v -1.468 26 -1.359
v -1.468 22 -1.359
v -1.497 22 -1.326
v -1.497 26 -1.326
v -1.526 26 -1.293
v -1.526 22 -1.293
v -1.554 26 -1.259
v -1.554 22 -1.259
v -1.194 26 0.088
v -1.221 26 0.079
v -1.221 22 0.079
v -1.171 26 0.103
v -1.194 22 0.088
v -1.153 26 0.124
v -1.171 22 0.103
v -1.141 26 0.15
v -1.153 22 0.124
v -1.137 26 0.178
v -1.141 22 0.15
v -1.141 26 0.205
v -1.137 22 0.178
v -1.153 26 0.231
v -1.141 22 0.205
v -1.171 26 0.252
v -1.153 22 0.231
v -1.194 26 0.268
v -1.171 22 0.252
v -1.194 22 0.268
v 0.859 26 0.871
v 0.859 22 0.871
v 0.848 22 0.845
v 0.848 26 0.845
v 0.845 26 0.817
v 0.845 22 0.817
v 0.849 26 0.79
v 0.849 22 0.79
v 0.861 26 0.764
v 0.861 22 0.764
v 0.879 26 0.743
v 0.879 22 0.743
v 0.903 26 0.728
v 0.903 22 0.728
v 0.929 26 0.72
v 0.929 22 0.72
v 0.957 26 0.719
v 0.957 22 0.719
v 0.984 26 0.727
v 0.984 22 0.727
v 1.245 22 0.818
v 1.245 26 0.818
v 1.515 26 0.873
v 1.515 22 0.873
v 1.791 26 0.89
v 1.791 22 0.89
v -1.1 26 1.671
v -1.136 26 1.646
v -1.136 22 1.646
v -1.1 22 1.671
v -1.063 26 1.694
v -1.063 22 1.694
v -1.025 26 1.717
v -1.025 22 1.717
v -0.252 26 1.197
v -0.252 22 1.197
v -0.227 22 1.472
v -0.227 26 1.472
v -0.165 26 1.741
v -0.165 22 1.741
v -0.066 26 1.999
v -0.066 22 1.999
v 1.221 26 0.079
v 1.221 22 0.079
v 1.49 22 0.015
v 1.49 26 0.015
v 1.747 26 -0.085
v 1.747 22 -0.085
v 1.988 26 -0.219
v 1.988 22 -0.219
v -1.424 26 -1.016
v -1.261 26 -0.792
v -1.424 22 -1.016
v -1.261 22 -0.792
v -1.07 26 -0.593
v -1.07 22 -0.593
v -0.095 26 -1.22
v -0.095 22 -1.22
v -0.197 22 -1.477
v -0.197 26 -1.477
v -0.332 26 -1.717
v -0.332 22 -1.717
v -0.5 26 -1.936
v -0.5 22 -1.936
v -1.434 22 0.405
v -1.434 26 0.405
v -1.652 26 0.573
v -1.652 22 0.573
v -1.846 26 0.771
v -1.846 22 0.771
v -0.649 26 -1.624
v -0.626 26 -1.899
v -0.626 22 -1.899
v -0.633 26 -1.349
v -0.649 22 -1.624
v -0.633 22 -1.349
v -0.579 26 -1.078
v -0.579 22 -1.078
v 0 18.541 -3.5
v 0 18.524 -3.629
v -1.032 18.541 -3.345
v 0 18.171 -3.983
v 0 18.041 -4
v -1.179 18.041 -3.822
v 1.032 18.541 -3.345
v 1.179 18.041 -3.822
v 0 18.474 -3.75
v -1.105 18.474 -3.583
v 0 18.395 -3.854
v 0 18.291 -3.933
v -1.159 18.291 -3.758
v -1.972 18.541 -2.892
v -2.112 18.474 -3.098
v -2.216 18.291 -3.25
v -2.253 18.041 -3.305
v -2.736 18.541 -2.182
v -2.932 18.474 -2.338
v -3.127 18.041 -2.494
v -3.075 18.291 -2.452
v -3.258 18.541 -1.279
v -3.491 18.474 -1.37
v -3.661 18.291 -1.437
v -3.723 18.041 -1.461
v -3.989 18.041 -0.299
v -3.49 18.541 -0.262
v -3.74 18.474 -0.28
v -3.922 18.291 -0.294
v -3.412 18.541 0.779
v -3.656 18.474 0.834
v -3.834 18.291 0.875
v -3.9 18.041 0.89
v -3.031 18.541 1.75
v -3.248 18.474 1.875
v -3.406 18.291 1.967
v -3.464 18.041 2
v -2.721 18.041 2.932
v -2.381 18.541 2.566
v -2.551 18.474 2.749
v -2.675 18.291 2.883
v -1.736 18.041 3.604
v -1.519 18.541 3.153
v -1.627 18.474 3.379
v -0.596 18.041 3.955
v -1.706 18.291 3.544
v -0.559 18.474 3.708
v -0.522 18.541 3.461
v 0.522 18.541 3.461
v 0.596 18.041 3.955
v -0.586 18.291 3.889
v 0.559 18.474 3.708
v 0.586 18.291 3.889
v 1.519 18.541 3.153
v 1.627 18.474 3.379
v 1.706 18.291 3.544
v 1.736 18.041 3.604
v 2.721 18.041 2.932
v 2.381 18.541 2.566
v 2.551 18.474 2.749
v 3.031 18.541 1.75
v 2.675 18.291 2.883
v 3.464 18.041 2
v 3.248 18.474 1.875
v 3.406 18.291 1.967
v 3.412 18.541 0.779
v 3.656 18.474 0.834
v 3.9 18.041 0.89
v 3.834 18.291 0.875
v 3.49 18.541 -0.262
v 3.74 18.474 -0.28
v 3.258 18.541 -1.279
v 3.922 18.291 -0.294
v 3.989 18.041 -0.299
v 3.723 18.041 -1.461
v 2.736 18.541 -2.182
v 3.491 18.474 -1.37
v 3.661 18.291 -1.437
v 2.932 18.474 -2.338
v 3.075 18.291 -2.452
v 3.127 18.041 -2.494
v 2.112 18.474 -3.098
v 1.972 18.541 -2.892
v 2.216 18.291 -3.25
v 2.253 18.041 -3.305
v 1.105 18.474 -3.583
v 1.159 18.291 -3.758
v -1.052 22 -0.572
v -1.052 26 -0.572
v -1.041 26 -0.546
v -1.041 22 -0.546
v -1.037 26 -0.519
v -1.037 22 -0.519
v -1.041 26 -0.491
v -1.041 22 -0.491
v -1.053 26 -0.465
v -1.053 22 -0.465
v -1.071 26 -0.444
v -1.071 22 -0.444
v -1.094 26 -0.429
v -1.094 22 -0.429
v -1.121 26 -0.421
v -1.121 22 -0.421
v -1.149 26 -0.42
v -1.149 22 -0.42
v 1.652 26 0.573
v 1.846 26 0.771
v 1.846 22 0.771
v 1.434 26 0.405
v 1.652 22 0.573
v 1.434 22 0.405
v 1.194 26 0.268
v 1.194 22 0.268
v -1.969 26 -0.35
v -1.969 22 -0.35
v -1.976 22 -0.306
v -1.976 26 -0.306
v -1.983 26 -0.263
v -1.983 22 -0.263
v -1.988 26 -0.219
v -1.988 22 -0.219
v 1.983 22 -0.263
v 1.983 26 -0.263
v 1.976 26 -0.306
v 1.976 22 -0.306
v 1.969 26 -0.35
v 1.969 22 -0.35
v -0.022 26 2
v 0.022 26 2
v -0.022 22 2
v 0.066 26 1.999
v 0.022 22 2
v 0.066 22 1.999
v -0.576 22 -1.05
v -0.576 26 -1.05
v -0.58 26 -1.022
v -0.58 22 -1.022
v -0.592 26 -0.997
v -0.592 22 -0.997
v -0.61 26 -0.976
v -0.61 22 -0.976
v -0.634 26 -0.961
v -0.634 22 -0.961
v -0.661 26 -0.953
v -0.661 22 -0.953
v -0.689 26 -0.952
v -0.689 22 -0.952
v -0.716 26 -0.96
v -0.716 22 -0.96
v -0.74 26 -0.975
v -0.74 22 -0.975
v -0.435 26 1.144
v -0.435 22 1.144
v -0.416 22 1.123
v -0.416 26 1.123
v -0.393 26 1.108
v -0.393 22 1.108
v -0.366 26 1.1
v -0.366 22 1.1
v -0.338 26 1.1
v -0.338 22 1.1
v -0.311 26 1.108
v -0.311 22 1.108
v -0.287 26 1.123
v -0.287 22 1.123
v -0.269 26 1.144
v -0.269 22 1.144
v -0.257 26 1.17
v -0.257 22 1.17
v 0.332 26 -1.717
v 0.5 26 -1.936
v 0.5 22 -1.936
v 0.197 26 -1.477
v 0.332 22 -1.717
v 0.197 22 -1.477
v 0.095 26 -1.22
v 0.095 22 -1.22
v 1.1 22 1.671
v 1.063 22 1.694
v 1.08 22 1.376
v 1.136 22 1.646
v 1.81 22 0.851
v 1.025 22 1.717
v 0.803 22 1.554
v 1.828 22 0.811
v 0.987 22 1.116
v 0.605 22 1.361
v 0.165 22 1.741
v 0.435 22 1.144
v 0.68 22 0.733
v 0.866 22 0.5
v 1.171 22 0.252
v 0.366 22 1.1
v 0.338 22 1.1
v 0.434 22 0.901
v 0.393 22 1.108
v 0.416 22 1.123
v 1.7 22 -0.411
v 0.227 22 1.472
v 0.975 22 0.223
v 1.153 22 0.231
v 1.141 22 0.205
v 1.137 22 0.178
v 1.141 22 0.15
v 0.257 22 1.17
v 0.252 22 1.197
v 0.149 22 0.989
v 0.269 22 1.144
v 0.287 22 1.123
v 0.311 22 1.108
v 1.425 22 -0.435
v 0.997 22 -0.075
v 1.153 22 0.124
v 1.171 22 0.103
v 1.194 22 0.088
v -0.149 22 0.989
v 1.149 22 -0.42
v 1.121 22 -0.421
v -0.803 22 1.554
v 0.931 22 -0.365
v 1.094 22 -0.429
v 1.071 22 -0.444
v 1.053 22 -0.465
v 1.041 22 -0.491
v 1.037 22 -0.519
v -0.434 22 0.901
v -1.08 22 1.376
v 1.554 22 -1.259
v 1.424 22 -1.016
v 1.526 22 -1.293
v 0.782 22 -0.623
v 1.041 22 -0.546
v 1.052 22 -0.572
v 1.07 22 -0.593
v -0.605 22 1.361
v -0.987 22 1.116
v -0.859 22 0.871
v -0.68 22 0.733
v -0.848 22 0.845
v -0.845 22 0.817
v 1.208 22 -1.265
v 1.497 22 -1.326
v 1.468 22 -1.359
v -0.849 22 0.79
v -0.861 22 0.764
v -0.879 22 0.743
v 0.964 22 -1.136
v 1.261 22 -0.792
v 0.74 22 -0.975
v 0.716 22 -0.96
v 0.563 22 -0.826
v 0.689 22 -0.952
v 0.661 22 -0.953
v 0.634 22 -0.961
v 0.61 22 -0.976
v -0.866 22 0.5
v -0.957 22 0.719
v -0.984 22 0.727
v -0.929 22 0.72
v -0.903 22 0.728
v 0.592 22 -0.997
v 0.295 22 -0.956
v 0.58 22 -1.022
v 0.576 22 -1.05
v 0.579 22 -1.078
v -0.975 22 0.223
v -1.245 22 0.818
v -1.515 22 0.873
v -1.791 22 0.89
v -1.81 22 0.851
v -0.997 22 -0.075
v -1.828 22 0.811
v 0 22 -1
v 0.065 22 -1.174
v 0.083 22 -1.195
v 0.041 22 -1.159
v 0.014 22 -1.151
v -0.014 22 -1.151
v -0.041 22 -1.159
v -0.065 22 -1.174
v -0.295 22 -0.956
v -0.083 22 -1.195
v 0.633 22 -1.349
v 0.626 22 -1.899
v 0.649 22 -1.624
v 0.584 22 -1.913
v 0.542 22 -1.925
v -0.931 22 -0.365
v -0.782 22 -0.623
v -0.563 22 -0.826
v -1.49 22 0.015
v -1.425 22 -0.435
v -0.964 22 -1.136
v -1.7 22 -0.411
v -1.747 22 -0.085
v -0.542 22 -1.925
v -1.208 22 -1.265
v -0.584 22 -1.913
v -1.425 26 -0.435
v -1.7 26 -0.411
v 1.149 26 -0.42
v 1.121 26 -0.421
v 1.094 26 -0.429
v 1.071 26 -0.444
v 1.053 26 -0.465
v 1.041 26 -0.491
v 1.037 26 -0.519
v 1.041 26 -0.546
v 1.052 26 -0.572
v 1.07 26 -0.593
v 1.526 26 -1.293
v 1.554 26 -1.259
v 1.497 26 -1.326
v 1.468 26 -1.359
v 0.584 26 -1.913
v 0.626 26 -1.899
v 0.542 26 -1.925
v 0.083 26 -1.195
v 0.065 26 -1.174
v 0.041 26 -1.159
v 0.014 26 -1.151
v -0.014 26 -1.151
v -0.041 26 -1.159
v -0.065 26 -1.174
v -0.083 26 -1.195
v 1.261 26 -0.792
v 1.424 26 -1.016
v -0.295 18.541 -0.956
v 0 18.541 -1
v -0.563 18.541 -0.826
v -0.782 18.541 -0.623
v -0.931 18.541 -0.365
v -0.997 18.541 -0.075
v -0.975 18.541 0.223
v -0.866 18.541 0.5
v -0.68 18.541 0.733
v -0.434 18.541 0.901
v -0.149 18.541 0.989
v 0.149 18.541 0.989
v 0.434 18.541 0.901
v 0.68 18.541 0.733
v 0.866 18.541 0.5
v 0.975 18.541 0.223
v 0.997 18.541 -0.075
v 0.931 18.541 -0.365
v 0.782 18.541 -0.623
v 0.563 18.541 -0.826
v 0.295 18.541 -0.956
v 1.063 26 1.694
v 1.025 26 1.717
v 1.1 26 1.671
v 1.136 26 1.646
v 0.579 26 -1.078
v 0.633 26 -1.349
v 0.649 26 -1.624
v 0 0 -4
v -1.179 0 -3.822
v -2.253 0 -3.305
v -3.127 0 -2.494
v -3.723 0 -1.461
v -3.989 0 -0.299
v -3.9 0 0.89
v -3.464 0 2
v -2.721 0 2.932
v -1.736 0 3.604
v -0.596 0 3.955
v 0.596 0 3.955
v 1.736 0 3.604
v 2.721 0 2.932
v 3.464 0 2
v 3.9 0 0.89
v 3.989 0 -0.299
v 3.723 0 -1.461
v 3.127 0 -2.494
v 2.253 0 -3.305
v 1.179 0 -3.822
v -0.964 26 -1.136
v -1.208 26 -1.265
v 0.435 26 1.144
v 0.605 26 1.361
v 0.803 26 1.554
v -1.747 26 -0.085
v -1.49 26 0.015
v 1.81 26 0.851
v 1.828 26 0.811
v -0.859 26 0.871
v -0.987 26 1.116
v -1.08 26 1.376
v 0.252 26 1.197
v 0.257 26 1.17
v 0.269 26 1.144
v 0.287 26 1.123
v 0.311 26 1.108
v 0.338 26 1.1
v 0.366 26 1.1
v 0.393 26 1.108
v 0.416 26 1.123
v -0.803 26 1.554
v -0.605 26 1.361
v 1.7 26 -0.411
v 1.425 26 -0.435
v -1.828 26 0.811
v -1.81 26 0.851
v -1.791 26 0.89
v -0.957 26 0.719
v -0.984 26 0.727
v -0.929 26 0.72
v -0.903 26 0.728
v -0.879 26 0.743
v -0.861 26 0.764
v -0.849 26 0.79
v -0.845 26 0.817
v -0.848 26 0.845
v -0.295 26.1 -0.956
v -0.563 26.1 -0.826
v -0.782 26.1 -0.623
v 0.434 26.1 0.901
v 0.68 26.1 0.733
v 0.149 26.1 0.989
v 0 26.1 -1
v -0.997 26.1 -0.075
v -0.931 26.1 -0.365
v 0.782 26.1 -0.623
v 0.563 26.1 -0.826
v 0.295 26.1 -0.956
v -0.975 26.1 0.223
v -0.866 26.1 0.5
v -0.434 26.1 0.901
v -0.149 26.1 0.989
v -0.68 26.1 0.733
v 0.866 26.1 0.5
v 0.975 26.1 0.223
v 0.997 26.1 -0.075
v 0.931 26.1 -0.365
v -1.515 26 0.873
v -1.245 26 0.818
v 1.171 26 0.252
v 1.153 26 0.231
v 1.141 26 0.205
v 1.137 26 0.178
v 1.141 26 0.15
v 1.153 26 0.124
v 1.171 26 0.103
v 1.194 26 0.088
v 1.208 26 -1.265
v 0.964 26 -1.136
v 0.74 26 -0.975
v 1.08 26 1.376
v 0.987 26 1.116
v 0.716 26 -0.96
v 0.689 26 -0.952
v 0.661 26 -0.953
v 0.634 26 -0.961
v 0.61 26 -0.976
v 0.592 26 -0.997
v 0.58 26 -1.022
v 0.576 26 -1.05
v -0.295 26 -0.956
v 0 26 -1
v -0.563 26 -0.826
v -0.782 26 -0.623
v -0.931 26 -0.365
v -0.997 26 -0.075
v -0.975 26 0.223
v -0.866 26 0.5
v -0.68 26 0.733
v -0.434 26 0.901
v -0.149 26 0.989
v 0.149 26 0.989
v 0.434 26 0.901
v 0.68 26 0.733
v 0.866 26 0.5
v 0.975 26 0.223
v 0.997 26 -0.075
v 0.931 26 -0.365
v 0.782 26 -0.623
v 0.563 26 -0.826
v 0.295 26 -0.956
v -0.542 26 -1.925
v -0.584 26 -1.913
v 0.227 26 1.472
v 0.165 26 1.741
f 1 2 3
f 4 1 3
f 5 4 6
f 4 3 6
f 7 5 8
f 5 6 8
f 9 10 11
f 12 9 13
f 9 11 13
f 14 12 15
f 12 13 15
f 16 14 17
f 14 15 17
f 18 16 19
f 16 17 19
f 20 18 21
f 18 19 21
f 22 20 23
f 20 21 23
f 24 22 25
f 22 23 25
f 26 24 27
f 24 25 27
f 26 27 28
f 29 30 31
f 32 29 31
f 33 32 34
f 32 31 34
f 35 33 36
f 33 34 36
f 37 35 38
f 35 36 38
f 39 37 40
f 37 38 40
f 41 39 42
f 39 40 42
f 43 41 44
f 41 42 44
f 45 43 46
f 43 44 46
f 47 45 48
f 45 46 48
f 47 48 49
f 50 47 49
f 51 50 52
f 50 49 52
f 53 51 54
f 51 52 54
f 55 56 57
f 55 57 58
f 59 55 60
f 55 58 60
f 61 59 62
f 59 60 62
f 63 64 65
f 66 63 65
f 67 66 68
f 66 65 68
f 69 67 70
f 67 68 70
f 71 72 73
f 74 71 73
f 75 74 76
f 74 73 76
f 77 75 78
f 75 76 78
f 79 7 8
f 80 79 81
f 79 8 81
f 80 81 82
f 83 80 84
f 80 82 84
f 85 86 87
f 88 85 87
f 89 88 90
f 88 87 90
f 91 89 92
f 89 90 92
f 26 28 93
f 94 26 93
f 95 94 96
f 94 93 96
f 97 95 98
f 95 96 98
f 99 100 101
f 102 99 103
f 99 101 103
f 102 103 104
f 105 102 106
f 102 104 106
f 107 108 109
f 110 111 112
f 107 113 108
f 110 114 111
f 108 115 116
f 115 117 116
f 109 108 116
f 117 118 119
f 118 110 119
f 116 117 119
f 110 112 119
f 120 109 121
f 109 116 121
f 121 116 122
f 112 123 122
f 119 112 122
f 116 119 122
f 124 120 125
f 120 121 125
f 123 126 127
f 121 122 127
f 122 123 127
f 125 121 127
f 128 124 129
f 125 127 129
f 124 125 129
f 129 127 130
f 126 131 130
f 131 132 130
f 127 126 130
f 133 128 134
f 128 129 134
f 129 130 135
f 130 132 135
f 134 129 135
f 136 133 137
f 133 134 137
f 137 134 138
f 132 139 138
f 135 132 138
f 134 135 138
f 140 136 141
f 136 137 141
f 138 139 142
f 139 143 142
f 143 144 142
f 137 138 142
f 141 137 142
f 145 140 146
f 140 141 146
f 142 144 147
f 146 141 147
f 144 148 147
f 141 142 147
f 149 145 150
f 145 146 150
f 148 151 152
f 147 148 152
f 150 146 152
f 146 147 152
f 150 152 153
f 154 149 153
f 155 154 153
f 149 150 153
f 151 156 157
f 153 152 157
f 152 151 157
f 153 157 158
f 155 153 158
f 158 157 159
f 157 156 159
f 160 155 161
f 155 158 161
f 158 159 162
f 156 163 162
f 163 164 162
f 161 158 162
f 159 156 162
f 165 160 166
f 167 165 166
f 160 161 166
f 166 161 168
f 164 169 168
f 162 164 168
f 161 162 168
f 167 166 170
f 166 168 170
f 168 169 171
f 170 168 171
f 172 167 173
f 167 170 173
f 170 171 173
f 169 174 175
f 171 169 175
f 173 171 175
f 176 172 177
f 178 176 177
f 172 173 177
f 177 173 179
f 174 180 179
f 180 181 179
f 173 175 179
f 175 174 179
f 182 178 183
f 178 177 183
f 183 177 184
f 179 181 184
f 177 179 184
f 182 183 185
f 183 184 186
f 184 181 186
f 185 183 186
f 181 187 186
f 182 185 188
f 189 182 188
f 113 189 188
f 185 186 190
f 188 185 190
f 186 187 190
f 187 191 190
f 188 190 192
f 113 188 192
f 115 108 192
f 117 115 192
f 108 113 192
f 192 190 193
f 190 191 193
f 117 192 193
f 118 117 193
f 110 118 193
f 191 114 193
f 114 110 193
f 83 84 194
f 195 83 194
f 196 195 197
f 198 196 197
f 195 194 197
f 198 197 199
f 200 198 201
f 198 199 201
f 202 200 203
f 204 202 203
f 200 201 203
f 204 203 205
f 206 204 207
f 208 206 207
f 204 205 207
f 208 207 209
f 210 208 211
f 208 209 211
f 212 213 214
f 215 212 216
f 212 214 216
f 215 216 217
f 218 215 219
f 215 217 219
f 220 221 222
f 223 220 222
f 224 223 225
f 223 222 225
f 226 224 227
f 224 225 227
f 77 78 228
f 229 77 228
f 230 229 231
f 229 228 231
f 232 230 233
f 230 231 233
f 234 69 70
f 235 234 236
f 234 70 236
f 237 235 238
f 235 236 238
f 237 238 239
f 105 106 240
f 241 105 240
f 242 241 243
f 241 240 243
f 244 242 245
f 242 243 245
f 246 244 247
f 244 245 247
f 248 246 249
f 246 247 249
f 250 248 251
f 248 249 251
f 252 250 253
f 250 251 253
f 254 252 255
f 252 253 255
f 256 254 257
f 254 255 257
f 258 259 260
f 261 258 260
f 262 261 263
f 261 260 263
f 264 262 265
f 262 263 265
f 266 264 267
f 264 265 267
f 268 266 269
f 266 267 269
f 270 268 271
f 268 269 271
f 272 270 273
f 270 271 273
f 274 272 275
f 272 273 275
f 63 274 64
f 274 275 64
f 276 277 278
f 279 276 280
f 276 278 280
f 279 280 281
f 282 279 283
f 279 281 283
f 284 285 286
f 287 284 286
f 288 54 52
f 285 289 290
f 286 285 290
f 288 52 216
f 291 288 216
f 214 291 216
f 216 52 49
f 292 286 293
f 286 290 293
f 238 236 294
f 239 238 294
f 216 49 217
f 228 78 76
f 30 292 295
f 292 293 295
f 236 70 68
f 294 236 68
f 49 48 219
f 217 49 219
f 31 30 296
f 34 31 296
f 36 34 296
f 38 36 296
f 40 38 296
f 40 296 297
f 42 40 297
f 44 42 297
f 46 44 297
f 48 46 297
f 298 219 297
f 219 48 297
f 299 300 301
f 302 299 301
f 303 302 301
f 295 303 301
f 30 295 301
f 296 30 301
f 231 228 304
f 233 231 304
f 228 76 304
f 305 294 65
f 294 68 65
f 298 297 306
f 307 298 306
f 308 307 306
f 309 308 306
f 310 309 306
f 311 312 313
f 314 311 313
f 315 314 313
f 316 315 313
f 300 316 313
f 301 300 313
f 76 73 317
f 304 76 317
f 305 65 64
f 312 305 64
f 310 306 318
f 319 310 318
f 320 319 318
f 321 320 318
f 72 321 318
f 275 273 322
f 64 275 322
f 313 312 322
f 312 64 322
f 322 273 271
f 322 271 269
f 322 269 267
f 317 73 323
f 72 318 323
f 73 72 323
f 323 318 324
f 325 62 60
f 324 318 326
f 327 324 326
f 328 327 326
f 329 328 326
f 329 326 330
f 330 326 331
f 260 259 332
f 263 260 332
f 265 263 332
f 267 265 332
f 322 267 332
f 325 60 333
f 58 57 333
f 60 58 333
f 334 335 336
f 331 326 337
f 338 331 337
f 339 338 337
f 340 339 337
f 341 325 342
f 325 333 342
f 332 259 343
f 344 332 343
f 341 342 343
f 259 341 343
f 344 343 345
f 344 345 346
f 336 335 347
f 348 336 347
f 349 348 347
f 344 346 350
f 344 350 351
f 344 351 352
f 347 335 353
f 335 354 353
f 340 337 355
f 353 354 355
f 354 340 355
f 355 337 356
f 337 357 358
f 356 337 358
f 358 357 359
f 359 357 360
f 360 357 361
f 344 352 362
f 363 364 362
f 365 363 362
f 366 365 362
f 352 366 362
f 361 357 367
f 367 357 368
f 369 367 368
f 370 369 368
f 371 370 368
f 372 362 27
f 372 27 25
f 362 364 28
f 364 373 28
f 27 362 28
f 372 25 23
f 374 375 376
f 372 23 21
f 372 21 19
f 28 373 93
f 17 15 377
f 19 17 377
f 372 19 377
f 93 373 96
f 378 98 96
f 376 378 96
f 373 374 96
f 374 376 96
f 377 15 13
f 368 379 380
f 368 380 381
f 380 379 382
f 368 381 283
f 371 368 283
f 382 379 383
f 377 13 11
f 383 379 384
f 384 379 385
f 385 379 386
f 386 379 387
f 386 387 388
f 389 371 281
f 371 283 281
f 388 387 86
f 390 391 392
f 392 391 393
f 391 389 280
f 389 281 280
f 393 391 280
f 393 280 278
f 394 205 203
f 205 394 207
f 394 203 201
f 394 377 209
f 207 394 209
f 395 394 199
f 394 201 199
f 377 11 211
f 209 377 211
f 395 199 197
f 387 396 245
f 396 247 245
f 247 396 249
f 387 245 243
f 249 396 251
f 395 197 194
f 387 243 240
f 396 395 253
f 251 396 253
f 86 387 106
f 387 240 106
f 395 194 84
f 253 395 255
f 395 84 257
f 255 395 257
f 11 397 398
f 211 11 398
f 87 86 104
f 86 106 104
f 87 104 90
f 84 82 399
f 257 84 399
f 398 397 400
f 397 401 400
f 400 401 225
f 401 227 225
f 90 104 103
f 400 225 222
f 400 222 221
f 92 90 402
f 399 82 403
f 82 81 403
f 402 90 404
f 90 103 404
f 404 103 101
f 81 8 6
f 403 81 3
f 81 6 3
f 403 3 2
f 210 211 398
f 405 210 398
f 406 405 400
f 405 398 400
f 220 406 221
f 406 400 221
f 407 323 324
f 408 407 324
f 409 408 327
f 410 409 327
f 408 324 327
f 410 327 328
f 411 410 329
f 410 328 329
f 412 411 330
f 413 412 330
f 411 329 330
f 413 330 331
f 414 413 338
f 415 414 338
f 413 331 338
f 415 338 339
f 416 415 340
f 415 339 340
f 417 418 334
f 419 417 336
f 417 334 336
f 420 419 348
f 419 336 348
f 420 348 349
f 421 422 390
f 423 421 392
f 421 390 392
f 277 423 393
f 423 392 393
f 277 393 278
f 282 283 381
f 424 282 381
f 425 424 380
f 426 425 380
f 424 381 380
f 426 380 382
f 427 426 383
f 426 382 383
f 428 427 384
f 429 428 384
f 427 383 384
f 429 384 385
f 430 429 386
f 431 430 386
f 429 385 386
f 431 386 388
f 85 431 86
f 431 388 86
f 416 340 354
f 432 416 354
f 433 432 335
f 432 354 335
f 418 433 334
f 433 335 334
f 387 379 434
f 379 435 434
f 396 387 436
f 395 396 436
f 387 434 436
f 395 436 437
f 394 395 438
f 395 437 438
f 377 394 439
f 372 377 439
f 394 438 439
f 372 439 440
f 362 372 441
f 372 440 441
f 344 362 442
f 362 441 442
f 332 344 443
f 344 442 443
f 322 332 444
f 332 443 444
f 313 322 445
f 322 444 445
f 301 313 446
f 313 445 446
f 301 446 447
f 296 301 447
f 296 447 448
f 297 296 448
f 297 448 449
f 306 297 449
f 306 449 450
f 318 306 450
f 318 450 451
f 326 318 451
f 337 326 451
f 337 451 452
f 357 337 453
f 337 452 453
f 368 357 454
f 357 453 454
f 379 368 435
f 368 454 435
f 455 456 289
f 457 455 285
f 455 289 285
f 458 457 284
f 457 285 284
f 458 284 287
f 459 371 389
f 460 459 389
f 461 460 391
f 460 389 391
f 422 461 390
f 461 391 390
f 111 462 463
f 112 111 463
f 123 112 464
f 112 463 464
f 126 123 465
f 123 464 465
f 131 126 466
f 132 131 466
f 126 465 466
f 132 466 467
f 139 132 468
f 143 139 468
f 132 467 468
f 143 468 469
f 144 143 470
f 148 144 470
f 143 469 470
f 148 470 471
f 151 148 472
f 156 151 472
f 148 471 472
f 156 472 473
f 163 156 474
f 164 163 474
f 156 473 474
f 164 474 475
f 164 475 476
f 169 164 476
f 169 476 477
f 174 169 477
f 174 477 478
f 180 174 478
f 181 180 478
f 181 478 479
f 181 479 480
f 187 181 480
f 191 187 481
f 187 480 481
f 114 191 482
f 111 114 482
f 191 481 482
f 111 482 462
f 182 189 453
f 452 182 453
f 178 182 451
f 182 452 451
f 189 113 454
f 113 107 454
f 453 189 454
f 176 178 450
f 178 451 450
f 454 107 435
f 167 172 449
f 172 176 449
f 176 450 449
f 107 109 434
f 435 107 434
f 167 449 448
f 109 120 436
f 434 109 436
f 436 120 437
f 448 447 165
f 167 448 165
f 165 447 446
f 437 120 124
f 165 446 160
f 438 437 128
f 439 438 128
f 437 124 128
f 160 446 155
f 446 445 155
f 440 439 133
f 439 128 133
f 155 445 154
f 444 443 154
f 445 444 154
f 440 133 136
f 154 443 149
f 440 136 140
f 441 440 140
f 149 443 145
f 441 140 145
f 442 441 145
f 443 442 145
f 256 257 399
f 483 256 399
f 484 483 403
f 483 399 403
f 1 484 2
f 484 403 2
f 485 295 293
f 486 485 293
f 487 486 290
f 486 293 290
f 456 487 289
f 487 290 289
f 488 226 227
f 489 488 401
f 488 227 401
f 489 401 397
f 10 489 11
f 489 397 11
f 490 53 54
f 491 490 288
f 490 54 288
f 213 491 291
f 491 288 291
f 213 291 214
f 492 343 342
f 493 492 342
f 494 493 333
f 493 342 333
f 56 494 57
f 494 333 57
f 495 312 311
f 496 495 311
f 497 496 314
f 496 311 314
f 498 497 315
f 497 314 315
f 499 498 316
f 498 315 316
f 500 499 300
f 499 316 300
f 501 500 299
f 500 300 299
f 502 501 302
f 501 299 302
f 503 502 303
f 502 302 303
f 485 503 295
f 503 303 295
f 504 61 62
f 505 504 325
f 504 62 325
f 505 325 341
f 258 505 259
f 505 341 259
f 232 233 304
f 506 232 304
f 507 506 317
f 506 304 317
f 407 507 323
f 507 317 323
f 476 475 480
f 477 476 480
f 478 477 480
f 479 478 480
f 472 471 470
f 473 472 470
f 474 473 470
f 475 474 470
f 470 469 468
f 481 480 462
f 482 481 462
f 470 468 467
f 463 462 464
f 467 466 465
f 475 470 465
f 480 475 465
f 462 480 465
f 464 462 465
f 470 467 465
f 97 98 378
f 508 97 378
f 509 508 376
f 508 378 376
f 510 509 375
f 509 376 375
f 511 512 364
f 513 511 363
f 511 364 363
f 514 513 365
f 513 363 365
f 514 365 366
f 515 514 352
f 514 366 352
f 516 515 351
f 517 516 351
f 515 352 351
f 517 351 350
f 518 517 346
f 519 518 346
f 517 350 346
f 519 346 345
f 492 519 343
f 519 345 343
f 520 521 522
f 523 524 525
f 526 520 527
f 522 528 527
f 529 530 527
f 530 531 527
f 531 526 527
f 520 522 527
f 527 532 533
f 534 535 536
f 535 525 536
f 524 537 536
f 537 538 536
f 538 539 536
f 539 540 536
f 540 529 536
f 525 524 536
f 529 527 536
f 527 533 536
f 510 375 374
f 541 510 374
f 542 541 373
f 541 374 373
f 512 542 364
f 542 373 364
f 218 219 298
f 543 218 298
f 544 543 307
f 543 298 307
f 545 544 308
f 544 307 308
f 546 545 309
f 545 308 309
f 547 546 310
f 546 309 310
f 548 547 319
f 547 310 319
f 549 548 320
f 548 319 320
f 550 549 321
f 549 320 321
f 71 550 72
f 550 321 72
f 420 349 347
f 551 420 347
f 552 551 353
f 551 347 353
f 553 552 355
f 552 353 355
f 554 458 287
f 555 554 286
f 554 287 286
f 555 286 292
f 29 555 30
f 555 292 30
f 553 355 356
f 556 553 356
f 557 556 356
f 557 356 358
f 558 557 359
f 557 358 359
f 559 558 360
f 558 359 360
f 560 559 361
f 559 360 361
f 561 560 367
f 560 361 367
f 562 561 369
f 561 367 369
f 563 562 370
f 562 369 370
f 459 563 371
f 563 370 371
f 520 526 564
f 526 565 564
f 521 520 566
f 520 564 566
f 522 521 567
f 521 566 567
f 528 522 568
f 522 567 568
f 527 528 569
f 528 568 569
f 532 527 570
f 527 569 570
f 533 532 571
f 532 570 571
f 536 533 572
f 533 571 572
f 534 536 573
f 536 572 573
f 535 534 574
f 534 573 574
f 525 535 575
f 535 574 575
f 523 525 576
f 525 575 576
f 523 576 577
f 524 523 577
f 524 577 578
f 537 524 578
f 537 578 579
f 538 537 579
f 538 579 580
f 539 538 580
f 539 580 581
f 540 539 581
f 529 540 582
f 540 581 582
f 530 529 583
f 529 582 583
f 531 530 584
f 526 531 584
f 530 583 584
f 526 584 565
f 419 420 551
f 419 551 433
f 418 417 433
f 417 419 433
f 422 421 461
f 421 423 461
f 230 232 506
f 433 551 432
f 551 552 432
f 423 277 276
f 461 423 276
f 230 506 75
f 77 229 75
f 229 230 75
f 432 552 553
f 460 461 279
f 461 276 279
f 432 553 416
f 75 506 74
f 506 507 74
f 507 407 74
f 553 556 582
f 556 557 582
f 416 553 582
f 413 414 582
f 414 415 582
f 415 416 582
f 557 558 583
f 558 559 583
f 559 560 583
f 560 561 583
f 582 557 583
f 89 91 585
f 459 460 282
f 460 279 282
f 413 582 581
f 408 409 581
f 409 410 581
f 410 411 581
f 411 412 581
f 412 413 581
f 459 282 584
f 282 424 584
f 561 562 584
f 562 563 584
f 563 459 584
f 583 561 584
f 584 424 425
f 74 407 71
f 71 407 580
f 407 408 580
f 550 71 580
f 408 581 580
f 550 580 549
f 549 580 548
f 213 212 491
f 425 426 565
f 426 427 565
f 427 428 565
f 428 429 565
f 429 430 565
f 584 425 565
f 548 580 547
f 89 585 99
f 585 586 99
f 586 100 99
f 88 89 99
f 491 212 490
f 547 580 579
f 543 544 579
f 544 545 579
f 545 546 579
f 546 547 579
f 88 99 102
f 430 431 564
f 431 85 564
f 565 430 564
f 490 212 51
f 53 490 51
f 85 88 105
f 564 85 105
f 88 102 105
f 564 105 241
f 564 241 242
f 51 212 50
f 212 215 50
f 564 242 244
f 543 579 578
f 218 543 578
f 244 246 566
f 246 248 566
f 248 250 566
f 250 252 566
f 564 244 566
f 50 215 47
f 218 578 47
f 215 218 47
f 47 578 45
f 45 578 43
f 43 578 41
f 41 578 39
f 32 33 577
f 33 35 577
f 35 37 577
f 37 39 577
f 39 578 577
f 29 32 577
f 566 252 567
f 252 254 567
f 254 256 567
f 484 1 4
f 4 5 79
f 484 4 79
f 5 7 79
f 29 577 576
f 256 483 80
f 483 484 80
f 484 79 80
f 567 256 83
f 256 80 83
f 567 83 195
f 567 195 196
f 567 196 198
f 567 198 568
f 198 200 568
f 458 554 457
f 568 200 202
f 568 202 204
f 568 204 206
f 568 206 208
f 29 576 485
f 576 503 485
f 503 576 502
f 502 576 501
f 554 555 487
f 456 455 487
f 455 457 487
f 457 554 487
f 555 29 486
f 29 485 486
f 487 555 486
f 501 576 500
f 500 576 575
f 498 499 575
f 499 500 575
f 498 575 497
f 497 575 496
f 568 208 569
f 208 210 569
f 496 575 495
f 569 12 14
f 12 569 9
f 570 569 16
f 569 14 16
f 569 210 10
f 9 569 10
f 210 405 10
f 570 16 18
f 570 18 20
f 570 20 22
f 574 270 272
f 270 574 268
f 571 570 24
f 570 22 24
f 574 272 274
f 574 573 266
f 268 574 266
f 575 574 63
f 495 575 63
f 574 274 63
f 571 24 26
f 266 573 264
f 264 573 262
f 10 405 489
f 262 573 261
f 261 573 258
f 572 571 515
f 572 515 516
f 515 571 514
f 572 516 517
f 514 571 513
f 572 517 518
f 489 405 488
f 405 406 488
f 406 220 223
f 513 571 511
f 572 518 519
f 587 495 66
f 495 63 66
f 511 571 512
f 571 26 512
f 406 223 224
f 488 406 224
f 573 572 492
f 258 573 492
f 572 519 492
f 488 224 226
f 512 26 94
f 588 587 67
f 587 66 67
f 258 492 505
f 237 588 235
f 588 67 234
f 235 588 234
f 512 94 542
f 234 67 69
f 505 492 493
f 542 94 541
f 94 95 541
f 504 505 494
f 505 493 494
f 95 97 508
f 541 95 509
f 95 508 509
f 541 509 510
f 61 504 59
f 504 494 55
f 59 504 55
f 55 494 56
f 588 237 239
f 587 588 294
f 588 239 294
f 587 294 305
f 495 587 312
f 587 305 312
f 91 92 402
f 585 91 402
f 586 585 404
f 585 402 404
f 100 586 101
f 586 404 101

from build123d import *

# Parameters (mm, degrees)
KES_EKSTR_ZYON1_START   = -5
KES_EKSTR_ZYON1_DEPTH   = 5
DAIRESEL_KAPLAMA1_COUNT = 11
RADYUS1_R               = 0.5


with BuildPart() as part:
    # Çizim2 → Döndür1 (revolve)
    with BuildSketch(Plane.XY, mode=Mode.PRIVATE) as d_nd_r1_sk:
        Polygon((0, 0), (0, 26.1), (1, 26.1), (1, 26), (2, 26), (2, 22), (1, 22), (1, 18.541448382), (4, 18.541448382), (4, 0), align=None)
    revolve(d_nd_r1_sk.sketch.rotate(Axis((0, 0, 0), (0, 1, 0)), 90), axis=Axis((0, 0, 0), (0, 1, 0)))

    # Çizim4 → Kes-Ekstrüzyon1 (cut)
    with BuildSketch(Plane(origin=(0, 26, 0), x_dir=(1, 0, 0), z_dir=(0, 1, 0)).offset(KES_EKSTR_ZYON1_START)):
        with BuildLine():
            ThreePointArc((-0.5, 1.936491673), (0, 2), (0.5, 1.936491673))
            ThreePointArc((0.5, 1.936491673), (0.260400333, 1.599188187), (0.095331419, 1.219801979))
            ThreePointArc((0.095331419, 1.219801979), (0, 1.15), (-0.095331419, 1.219801979))
            ThreePointArc((-0.095331419, 1.219801979), (-0.260400333, 1.599188187), (-0.5, 1.936491673))
        make_face()
    kes_ekstr_zyon1 = extrude(amount=KES_EKSTR_ZYON1_DEPTH, mode=Mode.SUBTRACT)

    # Dairesel Kaplama1: Kes-Ekstrüzyon1 ×11 about axis
    dairesel_kaplama1_axis = Axis((0, 0, 0), (0, 1, 0))
    for i in range(1, DAIRESEL_KAPLAMA1_COUNT):
        add(kes_ekstr_zyon1.rotate(dairesel_kaplama1_axis, i * 360 / DAIRESEL_KAPLAMA1_COUNT), mode=Mode.SUBTRACT)

    # Radyus1
    radyus1_edges = [part.edges().sort_by_distance(p)[0] for p in [
        (0, 18.541448382, 4),
    ]]
    fillet(radyus1_edges, radius=RADYUS1_R)


solid = part.part
